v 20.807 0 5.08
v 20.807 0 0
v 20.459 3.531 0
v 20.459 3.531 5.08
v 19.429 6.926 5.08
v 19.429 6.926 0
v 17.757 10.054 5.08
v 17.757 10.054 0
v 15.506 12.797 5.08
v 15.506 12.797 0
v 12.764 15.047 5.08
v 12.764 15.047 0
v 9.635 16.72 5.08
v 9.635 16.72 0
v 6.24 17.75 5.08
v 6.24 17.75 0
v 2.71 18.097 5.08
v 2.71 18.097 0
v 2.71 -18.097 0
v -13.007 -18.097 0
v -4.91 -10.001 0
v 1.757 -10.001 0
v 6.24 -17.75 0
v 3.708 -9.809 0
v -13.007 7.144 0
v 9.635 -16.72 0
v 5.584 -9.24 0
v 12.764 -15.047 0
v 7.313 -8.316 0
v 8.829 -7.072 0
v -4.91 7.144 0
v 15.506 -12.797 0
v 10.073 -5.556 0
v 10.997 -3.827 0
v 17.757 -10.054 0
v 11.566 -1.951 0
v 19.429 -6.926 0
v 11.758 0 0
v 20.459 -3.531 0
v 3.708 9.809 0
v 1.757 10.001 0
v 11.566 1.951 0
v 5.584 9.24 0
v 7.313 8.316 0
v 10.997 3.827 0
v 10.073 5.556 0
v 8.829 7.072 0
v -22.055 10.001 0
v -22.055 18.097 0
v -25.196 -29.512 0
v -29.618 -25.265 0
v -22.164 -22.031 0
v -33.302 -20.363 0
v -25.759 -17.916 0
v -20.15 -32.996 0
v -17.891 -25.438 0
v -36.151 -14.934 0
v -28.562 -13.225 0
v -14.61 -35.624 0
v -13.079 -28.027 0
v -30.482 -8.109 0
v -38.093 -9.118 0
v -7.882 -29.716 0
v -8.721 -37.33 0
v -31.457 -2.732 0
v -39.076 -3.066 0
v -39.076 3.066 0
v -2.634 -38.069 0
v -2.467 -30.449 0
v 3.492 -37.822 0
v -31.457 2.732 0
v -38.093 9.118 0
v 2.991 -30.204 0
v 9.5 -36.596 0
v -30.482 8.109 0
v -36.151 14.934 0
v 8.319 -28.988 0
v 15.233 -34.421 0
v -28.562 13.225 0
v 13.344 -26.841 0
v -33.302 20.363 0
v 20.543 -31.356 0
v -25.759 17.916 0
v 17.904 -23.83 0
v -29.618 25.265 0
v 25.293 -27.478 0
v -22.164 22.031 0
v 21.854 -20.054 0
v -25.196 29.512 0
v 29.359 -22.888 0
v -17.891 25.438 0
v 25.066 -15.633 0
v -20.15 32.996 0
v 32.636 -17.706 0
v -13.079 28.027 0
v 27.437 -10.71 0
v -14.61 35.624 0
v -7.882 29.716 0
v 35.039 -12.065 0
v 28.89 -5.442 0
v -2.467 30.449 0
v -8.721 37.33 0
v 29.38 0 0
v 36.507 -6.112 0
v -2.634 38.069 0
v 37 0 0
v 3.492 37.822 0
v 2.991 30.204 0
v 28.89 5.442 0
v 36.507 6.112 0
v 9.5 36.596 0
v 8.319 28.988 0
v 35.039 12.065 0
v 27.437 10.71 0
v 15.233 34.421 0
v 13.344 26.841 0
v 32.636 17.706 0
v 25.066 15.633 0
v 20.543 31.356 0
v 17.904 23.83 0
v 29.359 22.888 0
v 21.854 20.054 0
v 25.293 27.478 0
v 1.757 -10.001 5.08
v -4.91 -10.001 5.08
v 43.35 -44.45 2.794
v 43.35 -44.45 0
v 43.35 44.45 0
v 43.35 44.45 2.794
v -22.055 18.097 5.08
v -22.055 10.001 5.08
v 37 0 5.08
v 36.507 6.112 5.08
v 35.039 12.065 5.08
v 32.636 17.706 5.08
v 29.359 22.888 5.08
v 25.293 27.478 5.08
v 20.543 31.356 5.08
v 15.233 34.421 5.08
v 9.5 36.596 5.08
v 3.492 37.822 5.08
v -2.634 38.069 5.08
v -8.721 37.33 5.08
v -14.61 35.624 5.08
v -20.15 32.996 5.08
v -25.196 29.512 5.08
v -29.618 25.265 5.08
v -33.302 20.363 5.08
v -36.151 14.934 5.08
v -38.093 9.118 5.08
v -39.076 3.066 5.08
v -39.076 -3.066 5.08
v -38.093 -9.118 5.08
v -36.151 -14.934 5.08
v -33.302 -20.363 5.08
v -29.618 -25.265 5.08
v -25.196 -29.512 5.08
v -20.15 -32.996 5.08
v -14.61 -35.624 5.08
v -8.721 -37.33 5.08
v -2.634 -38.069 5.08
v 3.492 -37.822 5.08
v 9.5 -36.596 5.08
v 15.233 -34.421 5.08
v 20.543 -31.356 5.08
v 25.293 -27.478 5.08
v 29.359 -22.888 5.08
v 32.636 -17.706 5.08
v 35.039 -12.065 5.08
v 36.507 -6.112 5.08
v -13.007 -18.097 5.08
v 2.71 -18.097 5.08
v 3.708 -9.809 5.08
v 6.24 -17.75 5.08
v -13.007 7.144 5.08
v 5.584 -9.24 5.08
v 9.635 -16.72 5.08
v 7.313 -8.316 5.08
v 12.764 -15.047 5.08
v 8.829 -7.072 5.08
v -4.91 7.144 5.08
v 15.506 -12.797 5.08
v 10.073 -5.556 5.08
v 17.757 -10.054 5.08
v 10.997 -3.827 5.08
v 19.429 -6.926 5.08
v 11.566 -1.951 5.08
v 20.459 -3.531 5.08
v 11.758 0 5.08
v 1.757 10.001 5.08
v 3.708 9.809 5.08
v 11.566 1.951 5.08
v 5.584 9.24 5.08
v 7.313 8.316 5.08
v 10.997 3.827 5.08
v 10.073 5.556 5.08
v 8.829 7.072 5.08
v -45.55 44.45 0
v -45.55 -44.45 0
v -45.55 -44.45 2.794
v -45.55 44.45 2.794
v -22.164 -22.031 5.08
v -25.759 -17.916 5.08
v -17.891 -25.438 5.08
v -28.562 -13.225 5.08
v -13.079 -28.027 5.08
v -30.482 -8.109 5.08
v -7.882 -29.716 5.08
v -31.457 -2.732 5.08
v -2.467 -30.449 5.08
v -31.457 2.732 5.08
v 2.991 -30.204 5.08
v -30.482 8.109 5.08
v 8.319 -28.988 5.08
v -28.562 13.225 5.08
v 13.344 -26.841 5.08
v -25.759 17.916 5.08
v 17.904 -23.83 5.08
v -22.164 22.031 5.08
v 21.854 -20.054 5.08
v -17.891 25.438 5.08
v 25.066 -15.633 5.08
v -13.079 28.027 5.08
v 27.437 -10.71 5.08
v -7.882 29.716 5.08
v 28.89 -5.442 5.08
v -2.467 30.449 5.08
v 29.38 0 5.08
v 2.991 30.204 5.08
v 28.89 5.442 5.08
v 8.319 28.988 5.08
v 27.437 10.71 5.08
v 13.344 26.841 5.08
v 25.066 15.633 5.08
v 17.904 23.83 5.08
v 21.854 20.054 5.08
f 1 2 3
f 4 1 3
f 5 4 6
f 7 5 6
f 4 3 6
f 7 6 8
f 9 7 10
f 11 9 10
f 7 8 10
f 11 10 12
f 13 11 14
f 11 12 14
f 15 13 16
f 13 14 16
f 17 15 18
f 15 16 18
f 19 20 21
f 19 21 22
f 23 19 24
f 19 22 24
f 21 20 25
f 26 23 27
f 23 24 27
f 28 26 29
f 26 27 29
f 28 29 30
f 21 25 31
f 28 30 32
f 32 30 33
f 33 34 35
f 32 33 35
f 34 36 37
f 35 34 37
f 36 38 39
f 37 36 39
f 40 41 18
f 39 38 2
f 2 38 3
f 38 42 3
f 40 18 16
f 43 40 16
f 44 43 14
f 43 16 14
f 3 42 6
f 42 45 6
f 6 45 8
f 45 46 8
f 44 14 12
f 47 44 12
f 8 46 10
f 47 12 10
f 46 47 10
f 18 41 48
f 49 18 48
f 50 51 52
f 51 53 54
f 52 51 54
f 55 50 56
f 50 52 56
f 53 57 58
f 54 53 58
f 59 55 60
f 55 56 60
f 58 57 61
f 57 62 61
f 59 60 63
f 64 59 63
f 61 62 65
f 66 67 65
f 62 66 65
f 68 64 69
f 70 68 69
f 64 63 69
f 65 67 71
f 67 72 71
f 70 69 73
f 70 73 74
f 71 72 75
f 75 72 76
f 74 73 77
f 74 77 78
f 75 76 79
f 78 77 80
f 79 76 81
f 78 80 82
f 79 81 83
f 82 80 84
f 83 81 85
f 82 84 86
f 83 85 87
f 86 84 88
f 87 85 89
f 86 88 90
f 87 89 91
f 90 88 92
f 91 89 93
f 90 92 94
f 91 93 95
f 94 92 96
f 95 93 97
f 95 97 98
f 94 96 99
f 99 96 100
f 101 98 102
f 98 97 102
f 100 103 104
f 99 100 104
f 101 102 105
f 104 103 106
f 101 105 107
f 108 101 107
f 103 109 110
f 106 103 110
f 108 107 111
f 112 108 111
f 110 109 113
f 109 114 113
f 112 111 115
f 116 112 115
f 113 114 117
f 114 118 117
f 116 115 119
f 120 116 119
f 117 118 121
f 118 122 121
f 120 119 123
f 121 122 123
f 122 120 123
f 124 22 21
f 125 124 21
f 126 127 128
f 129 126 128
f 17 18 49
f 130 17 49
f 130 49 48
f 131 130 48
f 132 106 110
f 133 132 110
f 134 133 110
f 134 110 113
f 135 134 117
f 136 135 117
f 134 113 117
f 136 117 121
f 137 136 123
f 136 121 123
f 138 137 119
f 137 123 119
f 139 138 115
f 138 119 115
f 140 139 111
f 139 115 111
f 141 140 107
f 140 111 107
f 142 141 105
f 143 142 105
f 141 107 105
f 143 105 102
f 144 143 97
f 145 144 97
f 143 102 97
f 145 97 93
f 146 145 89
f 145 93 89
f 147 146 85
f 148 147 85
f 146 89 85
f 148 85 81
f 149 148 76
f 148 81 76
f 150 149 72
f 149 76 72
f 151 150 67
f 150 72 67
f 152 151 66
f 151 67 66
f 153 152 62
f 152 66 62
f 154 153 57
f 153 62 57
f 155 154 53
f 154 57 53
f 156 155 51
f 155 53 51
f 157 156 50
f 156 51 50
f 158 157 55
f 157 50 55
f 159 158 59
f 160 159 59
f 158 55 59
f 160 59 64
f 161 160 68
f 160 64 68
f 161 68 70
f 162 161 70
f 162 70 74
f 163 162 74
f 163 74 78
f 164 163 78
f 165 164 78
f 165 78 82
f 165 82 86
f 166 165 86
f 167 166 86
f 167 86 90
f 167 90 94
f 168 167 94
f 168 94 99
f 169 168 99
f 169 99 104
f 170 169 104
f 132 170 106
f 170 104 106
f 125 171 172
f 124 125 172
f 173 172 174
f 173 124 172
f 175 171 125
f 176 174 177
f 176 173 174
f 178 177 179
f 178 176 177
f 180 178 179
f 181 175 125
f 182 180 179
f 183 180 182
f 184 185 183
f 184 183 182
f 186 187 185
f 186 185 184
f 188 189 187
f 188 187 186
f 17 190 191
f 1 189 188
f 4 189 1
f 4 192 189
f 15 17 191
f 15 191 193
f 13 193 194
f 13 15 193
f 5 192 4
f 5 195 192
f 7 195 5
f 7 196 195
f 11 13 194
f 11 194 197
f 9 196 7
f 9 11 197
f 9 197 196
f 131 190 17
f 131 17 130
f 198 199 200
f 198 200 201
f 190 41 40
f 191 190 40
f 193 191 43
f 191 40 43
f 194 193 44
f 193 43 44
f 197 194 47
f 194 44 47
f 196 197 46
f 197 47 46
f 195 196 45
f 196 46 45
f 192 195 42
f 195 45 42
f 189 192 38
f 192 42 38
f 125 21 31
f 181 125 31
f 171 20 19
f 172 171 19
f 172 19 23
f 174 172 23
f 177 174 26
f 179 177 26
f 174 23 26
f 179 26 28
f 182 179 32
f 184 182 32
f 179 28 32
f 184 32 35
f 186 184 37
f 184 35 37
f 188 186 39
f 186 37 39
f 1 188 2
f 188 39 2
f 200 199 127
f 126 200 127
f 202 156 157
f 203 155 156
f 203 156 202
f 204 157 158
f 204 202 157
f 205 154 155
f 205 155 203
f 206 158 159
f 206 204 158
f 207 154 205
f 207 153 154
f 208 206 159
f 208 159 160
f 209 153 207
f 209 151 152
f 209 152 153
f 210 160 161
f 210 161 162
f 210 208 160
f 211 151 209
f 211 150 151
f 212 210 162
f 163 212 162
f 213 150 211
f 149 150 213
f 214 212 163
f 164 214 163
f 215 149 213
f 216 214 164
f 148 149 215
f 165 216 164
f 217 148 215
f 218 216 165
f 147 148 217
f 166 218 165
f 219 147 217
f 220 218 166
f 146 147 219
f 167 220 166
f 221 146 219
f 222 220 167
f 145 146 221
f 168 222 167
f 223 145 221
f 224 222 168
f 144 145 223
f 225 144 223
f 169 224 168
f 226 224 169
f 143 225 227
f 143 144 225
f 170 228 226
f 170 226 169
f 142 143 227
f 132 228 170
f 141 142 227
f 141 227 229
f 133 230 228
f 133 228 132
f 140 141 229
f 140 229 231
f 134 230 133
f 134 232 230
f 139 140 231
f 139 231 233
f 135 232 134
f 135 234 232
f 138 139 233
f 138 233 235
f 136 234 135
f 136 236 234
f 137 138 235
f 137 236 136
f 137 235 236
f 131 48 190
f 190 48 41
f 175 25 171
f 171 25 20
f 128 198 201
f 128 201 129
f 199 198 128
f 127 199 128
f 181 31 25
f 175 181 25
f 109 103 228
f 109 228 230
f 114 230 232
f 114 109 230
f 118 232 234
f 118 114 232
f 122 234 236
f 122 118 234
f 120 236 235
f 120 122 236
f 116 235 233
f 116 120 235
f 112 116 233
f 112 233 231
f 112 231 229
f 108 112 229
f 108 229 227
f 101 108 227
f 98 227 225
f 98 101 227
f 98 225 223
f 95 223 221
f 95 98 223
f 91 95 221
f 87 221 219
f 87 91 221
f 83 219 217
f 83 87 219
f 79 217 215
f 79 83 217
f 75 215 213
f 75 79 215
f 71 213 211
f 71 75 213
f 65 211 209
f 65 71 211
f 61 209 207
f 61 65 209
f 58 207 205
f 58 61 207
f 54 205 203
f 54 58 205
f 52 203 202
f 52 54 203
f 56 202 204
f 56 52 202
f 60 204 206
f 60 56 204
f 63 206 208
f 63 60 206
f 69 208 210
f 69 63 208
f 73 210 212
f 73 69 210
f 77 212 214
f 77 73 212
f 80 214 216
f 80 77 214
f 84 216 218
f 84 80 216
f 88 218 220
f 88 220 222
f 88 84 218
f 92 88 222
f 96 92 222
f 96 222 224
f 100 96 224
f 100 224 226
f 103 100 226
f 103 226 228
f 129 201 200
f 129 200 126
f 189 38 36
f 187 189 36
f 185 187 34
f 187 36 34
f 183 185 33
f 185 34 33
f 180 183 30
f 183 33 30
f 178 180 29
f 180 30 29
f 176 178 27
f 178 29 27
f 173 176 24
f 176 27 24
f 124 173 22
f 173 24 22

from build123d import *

# Parameters (mm, degrees)
F1_DEPTH = 5.08
F0_R     = 38.1
F0_R_2   = 30.4800761992
F2_W     = 88.9
F2_H     = 88.9
F3_DEPTH = 2.794


with BuildPart() as f1:
    # F0 (on Top) → F1 (new body)
    with BuildSketch(Plane.XY):
        Polygon((-13.0065079349, -18.0973190268), (-4.9103388966, -18.0973190268), (-4.9103388966, -10.0011499885), (-4.9103388966, 7.1436785632), (-13.0065079349, 7.1436785632), align=None)
        with BuildLine():
            Line((11.7582444176, 0), (20.806903931, 0))
            ThreePointArc((20.806903931, 0), (15.5063219093, 12.7967370052), (2.7095849042, 18.0973190268))
            Line((2.7095849042, 18.0973190268), (-22.0551674483, 18.0973190268))
            Line((-22.0551674483, 18.0973190268), (-22.0551674483, 10.0011499885))
            Line((-22.0551674483, 10.0011499885), (1.7570944291, 10.0011499885))
            ThreePointArc((1.7570944291, 10.0011499885), (8.8289754056, 7.0718809765), (11.7582444176, 0))
        make_face()
        with BuildLine():
            Line((-4.9103388966, -10.0011499885), (-4.9103388966, -18.0973190268))
            Line((-4.9103388966, -18.0973190268), (2.7095849042, -18.0973190268))
            ThreePointArc((2.7095849042, -18.0973190268), (15.5063219093, -12.7967370052), (20.806903931, 0))
            Line((20.806903931, 0), (11.7582444176, 0))
            ThreePointArc((11.7582444176, 0), (8.8289754056, -7.0718809765), (1.7570944291, -10.0011499885))
            Line((1.7570944291, -10.0011499885), (-4.9103388966, -10.0011499885))
        make_face()
    extrude(amount=F1_DEPTH)


with BuildPart() as f1b:
    # F0 (on Top) → F1, piece 2 (new body)
    with BuildSketch(Plane.XY):
        with Locations((-1.099996, 0)):
            Circle(F0_R)
        with Locations((-1.099996, 0)):
            Circle(F0_R_2, mode=Mode.SUBTRACT)
    extrude(amount=F1_DEPTH)


with BuildPart() as f3:
    # F2 (on Top) → F3 (new body)
    with BuildSketch(Plane.XY):
        with Locations((-1.099996, 0)):
            Rectangle(F2_W, F2_H)
    extrude(amount=F3_DEPTH)


solid = Compound([f1.part, f1b.part, f3.part])
